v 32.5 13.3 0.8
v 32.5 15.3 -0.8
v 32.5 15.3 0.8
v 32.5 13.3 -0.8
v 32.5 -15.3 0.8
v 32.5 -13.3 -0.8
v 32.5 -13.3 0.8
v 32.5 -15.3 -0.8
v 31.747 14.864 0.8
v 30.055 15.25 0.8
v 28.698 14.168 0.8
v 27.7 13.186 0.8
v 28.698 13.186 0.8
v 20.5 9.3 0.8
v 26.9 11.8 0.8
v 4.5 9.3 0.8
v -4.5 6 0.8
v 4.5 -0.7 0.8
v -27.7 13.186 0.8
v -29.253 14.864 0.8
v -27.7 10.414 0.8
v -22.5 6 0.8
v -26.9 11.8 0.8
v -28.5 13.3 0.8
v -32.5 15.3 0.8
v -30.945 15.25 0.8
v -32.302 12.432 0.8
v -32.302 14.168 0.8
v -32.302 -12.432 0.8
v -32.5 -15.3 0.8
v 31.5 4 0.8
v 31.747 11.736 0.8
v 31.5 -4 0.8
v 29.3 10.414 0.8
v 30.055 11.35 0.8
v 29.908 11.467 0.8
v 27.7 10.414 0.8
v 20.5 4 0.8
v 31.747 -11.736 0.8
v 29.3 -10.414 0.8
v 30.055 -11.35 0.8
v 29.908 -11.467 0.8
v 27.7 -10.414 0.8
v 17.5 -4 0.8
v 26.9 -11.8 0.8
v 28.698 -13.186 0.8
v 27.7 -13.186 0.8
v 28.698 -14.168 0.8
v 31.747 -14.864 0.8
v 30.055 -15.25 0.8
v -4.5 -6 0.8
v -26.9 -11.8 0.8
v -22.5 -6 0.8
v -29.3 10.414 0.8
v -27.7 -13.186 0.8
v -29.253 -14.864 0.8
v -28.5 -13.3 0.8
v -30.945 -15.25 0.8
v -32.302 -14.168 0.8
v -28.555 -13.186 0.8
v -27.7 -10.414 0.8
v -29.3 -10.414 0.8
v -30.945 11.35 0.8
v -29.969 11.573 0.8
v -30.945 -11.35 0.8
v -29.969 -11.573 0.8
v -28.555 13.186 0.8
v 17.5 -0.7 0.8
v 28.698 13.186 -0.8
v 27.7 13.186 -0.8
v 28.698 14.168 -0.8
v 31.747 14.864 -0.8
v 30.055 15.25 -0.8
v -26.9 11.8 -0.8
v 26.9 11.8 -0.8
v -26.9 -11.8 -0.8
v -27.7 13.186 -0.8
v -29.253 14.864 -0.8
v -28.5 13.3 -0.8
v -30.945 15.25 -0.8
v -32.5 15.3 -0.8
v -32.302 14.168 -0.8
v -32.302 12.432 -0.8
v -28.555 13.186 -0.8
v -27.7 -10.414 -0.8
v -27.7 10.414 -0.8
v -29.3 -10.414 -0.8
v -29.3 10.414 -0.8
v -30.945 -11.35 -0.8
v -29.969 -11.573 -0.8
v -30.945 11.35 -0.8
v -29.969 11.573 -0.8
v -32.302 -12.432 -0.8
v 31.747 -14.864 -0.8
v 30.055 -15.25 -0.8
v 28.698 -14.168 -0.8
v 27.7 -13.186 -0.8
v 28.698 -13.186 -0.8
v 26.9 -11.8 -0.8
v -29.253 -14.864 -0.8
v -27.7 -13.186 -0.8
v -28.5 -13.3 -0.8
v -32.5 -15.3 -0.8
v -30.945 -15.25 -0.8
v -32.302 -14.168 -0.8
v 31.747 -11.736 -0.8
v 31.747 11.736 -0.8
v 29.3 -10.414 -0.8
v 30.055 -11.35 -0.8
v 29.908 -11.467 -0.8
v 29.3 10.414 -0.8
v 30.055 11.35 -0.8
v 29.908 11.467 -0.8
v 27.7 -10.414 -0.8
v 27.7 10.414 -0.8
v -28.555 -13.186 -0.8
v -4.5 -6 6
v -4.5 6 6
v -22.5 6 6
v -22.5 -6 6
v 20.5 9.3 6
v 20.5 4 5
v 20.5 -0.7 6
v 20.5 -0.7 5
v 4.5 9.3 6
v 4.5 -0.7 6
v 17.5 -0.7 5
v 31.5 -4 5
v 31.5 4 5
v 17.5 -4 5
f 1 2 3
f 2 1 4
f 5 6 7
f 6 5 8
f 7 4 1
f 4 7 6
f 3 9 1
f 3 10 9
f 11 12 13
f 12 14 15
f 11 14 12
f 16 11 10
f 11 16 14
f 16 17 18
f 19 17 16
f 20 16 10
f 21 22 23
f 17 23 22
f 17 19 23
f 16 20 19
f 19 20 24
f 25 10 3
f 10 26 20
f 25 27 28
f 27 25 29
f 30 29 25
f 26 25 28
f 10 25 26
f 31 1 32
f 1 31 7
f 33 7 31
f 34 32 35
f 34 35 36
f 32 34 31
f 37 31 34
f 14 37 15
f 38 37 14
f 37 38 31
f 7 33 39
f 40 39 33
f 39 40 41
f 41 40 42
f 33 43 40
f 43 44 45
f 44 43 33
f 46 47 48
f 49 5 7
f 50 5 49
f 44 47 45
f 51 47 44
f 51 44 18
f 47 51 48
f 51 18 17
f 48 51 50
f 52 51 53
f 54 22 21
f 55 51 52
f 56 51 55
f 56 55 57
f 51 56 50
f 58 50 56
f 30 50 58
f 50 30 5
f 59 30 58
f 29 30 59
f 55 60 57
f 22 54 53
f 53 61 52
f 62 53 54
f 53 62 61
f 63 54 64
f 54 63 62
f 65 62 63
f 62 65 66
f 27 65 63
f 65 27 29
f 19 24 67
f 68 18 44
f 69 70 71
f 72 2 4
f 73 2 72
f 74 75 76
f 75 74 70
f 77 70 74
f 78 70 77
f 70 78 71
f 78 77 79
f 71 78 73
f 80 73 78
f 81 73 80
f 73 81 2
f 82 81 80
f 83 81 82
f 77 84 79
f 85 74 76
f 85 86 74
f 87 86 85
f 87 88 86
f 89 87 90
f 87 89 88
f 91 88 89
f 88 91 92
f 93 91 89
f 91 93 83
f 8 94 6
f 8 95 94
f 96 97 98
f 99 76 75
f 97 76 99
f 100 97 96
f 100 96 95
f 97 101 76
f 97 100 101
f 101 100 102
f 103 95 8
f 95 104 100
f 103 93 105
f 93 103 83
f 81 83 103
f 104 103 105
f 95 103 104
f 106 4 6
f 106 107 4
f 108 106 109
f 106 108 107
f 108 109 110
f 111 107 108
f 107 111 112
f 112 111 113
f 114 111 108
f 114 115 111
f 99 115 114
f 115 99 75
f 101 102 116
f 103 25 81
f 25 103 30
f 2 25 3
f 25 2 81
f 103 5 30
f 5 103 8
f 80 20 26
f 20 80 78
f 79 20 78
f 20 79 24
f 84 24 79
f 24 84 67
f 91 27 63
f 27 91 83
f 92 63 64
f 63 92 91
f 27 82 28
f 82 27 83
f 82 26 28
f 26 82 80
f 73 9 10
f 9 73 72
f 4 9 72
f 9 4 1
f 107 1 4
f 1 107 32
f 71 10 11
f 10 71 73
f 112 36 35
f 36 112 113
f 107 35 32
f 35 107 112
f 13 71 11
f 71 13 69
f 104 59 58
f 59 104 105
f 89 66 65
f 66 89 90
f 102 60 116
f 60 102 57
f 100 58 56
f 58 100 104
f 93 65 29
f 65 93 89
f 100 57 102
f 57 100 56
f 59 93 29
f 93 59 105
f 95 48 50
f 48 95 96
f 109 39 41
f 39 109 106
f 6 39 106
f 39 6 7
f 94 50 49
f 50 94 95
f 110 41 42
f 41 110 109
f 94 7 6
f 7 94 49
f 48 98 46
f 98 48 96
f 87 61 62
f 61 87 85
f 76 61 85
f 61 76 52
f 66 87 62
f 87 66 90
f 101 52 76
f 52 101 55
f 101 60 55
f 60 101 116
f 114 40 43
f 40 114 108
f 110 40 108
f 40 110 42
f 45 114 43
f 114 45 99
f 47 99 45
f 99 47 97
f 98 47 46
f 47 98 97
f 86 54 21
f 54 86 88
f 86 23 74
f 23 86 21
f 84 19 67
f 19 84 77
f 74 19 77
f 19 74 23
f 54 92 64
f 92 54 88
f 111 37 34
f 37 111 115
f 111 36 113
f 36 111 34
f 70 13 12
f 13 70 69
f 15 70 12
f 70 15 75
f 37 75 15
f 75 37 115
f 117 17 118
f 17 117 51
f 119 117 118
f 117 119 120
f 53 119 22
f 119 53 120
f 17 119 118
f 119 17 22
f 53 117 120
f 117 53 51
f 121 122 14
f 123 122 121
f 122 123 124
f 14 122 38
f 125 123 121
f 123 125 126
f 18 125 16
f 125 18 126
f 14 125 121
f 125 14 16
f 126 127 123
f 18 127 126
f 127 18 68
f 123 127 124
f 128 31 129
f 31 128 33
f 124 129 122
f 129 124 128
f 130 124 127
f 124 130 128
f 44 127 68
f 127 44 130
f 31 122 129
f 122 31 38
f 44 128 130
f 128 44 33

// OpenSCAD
// Parameters
pcb_length = 65.0; //[32.5:130.0:0.1]
pcb_width = 30.6; //[15.3:61.2:0.1]
pcb_thickness = 1.6; //[0.8:3.2:0.1]
edge_fillet_radius = 2.0; //[1.0:4.0:0.1]
mount_hole_diameter = 3.2; //[2.0:6.0:0.1]
mount_hole_edge_offset_x = 4.0; //[2.0:10.0:0.1]
mount_hole_edge_offset_y = 3.5; //[2.0:10.0:0.1]
keepout_height = 6.0; //[2.0:15.0:0.5]
keepout_thickness_overlap = 0.8; //[0.5:2.0:0.1]
connector_length = 14.0; //[7.0:28.0:0.5]
connector_width = 8.0; //[4.0:16.0:0.5]
connector_height = 5.0; //[2.0:12.0:0.5]
connector_edge_inset = 1.0; //[0.5:4.0:0.1]
silkscreen_height = 0.2; //[0.1:0.6:0.05]
silkscreen_overlap = 0.3; //[0.1:1.0:0.05]

// Base Shapes
module pcb_main_board() {
  color([0.0, 0.4, 0.2]) // Green PCB
  cube([pcb_length, pcb_width, pcb_thickness], center=true);
}

module corner_cutout_cyl() {
  cylinder(r=edge_fillet_radius, h=pcb_thickness*2, center=true);
}

module mount_hole_cyl() {
  cylinder(r=mount_hole_diameter/2, h=pcb_thickness*3, center=true);
}

module keepout_block_1() {
  color([0.85, 0.85, 0.8]) // Off-white for keepout
  translate([-pcb_length/2 + 18/2 + 10, 0, pcb_thickness/2 + keepout_height/2 - keepout_thickness_overlap])
    cube([18, 12, keepout_height], center=true);
}

module keepout_block_2() {
  color([0.85, 0.85, 0.8]) // Off-white for keepout
  translate([pcb_length/2 - 16/2 - 12, pcb_width/2 - 10/2 - 6, pcb_thickness/2 + keepout_height/2 - keepout_thickness_overlap])
    cube([16, 10, keepout_height], center=true);
}

module connector_outline() {
  color([0.1, 0.1, 0.6]) // Blue for connector
  translate([pcb_length/2 - connector_edge_inset - connector_length/2, 0, pcb_thickness/2 + connector_height/2 - keepout_thickness_overlap])
    cube([connector_length, connector_width, connector_height], center=true);
}

module silkscreen_marking_1() {
  color([1, 1, 1]) // White for silkscreen
  translate([0, pcb_width/2 - 0.6/2 - 1.2, pcb_thickness/2 + silkscreen_height/2 - silkscreen_overlap])
    cube([pcb_length*0.7, 0.6, silkscreen_height], center=true);
}

module silkscreen_marking_2() {
  color([1, 1, 1]) // White for silkscreen
  translate([-pcb_length/2 + 0.6/2 + 1.2, 0, pcb_thickness/2 + silkscreen_height/2 - silkscreen_overlap])
    cube([0.6, pcb_width*0.7, silkscreen_height], center=true);
}

// Operations
module corner_fillets() {
  difference() {
    pcb_main_board();
    translate([-pcb_length/2 + edge_fillet_radius, pcb_width/2 - edge_fillet_radius, 0]) corner_cutout_cyl();
    translate([pcb_length/2 - edge_fillet_radius, pcb_width/2 - edge_fillet_radius, 0]) corner_cutout_cyl();
    translate([-pcb_length/2 + edge_fillet_radius, -pcb_width/2 + edge_fillet_radius, 0]) corner_cutout_cyl();
    translate([pcb_length/2 - edge_fillet_radius, -pcb_width/2 + edge_fillet_radius, 0]) corner_cutout_cyl();
  }
}

module mounting_holes() {
  difference() {
    corner_fillets();
    translate([-pcb_length/2 + mount_hole_edge_offset_x, -pcb_width/2 + mount_hole_edge_offset_y, 0]) mount_hole_cyl();
    translate([pcb_length/2 - mount_hole_edge_offset_x, -pcb_width/2 + mount_hole_edge_offset_y, 0]) mount_hole_cyl();
    translate([-pcb_length/2 + mount_hole_edge_offset_x, pcb_width/2 - mount_hole_edge_offset_y, 0]) mount_hole_cyl();
    translate([pcb_length/2 - mount_hole_edge_offset_x, pcb_width/2 - mount_hole_edge_offset_y, 0]) mount_hole_cyl();
  }
}

module component_keepout_blocks() {
  union() {
    keepout_block_1();
    keepout_block_2();
  }
}

module silkscreen_markings() {
  union() {
    silkscreen_marking_1();
    silkscreen_marking_2();
  }
}

// Final Model
module pcb_complete_model() {
  union() {
    mounting_holes();
    component_keepout_blocks();
    connector_outline();
    silkscreen_markings();
  }
}

// Render the complete PCB model
pcb_complete_model();
